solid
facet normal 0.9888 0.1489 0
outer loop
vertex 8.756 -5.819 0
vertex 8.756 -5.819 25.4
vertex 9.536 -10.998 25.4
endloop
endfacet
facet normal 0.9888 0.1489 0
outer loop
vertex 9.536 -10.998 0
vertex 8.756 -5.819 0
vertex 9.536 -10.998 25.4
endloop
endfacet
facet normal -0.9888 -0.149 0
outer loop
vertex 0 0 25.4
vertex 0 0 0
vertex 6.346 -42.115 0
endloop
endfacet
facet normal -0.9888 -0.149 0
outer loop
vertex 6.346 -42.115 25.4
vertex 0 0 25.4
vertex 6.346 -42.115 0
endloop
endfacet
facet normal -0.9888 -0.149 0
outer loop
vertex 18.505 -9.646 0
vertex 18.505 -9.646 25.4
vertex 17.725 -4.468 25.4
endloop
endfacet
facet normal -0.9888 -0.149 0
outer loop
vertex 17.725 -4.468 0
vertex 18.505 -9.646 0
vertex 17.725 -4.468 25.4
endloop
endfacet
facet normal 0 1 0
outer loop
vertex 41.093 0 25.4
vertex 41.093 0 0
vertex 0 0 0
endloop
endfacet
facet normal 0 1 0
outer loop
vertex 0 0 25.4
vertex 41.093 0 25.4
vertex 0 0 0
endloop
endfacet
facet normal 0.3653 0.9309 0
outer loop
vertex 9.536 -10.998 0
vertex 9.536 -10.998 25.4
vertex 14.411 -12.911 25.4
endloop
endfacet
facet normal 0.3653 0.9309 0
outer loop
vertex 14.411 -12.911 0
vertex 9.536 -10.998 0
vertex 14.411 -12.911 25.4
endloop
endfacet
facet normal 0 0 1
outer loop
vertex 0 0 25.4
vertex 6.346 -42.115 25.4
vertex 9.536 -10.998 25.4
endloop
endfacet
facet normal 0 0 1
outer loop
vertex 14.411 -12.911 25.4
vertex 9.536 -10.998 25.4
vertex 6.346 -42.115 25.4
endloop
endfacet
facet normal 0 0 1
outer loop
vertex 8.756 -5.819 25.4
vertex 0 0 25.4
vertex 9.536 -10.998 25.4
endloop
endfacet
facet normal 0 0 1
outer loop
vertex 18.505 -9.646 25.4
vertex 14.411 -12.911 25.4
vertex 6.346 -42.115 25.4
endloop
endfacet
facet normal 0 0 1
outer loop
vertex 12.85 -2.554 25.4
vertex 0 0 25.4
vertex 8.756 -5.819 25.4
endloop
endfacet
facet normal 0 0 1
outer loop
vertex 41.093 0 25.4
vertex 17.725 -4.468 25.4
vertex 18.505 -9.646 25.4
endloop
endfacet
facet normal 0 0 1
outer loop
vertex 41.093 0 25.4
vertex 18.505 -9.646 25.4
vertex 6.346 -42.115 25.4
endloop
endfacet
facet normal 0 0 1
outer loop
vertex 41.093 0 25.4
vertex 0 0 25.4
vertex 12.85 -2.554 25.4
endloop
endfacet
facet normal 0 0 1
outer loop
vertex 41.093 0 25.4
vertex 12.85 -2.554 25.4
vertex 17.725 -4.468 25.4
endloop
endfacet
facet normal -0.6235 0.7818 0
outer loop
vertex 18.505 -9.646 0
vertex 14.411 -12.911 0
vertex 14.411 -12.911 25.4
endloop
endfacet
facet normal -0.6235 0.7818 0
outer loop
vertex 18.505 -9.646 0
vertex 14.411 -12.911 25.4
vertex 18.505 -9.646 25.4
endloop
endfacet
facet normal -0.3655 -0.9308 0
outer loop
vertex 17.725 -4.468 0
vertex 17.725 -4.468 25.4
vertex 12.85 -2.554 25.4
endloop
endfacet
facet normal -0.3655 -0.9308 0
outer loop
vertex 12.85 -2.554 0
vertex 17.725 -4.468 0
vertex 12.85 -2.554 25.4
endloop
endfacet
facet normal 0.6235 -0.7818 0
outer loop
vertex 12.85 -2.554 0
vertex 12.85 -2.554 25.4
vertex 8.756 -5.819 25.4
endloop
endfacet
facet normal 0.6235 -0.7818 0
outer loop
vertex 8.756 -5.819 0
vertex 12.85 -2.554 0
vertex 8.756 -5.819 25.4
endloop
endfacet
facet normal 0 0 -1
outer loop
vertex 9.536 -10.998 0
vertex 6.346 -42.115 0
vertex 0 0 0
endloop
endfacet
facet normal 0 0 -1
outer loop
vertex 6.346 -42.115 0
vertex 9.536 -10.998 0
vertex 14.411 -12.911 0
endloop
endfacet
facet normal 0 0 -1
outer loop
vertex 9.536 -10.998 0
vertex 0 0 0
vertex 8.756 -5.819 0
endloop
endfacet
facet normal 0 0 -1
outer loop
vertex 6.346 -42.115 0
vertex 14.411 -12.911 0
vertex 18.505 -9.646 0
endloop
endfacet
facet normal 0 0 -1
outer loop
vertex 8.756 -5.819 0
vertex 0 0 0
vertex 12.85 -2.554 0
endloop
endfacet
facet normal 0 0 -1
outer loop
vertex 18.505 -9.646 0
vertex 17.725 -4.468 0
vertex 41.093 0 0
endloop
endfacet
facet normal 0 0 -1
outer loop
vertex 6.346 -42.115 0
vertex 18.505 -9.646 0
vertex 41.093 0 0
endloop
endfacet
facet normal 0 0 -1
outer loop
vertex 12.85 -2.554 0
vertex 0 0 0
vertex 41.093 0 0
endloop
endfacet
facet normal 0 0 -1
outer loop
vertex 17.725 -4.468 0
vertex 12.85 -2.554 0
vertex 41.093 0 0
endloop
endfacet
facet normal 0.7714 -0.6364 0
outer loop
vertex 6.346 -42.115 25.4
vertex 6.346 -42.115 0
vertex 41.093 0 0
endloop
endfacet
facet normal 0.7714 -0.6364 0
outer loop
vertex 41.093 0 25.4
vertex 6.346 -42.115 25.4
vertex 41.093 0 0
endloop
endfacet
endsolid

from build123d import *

# Parameters (mm, degrees)
F1_DEPTH = 25.4
F3_DEPTH = 25.4


with BuildPart() as f1:
    # F0 (on Top) → F1 (new body)
    with BuildSketch(Plane.XY):
        Polygon((41.092899, 0), (0, 0), (6.345855, -42.114921), align=None)
    extrude(amount=F1_DEPTH)

    # F2 (on face) → F3 (cut)
    with BuildSketch(Plane.XY.offset(25.4)):
        Polygon((18.505031, -9.646224), (17.724764, -4.467904), (12.850075, -2.554476), (8.755653, -5.819366), (9.535919, -10.997685), (14.410608, -12.911114), align=None)
    extrude(amount=-F3_DEPTH, mode=Mode.SUBTRACT)


solid = f1.part
